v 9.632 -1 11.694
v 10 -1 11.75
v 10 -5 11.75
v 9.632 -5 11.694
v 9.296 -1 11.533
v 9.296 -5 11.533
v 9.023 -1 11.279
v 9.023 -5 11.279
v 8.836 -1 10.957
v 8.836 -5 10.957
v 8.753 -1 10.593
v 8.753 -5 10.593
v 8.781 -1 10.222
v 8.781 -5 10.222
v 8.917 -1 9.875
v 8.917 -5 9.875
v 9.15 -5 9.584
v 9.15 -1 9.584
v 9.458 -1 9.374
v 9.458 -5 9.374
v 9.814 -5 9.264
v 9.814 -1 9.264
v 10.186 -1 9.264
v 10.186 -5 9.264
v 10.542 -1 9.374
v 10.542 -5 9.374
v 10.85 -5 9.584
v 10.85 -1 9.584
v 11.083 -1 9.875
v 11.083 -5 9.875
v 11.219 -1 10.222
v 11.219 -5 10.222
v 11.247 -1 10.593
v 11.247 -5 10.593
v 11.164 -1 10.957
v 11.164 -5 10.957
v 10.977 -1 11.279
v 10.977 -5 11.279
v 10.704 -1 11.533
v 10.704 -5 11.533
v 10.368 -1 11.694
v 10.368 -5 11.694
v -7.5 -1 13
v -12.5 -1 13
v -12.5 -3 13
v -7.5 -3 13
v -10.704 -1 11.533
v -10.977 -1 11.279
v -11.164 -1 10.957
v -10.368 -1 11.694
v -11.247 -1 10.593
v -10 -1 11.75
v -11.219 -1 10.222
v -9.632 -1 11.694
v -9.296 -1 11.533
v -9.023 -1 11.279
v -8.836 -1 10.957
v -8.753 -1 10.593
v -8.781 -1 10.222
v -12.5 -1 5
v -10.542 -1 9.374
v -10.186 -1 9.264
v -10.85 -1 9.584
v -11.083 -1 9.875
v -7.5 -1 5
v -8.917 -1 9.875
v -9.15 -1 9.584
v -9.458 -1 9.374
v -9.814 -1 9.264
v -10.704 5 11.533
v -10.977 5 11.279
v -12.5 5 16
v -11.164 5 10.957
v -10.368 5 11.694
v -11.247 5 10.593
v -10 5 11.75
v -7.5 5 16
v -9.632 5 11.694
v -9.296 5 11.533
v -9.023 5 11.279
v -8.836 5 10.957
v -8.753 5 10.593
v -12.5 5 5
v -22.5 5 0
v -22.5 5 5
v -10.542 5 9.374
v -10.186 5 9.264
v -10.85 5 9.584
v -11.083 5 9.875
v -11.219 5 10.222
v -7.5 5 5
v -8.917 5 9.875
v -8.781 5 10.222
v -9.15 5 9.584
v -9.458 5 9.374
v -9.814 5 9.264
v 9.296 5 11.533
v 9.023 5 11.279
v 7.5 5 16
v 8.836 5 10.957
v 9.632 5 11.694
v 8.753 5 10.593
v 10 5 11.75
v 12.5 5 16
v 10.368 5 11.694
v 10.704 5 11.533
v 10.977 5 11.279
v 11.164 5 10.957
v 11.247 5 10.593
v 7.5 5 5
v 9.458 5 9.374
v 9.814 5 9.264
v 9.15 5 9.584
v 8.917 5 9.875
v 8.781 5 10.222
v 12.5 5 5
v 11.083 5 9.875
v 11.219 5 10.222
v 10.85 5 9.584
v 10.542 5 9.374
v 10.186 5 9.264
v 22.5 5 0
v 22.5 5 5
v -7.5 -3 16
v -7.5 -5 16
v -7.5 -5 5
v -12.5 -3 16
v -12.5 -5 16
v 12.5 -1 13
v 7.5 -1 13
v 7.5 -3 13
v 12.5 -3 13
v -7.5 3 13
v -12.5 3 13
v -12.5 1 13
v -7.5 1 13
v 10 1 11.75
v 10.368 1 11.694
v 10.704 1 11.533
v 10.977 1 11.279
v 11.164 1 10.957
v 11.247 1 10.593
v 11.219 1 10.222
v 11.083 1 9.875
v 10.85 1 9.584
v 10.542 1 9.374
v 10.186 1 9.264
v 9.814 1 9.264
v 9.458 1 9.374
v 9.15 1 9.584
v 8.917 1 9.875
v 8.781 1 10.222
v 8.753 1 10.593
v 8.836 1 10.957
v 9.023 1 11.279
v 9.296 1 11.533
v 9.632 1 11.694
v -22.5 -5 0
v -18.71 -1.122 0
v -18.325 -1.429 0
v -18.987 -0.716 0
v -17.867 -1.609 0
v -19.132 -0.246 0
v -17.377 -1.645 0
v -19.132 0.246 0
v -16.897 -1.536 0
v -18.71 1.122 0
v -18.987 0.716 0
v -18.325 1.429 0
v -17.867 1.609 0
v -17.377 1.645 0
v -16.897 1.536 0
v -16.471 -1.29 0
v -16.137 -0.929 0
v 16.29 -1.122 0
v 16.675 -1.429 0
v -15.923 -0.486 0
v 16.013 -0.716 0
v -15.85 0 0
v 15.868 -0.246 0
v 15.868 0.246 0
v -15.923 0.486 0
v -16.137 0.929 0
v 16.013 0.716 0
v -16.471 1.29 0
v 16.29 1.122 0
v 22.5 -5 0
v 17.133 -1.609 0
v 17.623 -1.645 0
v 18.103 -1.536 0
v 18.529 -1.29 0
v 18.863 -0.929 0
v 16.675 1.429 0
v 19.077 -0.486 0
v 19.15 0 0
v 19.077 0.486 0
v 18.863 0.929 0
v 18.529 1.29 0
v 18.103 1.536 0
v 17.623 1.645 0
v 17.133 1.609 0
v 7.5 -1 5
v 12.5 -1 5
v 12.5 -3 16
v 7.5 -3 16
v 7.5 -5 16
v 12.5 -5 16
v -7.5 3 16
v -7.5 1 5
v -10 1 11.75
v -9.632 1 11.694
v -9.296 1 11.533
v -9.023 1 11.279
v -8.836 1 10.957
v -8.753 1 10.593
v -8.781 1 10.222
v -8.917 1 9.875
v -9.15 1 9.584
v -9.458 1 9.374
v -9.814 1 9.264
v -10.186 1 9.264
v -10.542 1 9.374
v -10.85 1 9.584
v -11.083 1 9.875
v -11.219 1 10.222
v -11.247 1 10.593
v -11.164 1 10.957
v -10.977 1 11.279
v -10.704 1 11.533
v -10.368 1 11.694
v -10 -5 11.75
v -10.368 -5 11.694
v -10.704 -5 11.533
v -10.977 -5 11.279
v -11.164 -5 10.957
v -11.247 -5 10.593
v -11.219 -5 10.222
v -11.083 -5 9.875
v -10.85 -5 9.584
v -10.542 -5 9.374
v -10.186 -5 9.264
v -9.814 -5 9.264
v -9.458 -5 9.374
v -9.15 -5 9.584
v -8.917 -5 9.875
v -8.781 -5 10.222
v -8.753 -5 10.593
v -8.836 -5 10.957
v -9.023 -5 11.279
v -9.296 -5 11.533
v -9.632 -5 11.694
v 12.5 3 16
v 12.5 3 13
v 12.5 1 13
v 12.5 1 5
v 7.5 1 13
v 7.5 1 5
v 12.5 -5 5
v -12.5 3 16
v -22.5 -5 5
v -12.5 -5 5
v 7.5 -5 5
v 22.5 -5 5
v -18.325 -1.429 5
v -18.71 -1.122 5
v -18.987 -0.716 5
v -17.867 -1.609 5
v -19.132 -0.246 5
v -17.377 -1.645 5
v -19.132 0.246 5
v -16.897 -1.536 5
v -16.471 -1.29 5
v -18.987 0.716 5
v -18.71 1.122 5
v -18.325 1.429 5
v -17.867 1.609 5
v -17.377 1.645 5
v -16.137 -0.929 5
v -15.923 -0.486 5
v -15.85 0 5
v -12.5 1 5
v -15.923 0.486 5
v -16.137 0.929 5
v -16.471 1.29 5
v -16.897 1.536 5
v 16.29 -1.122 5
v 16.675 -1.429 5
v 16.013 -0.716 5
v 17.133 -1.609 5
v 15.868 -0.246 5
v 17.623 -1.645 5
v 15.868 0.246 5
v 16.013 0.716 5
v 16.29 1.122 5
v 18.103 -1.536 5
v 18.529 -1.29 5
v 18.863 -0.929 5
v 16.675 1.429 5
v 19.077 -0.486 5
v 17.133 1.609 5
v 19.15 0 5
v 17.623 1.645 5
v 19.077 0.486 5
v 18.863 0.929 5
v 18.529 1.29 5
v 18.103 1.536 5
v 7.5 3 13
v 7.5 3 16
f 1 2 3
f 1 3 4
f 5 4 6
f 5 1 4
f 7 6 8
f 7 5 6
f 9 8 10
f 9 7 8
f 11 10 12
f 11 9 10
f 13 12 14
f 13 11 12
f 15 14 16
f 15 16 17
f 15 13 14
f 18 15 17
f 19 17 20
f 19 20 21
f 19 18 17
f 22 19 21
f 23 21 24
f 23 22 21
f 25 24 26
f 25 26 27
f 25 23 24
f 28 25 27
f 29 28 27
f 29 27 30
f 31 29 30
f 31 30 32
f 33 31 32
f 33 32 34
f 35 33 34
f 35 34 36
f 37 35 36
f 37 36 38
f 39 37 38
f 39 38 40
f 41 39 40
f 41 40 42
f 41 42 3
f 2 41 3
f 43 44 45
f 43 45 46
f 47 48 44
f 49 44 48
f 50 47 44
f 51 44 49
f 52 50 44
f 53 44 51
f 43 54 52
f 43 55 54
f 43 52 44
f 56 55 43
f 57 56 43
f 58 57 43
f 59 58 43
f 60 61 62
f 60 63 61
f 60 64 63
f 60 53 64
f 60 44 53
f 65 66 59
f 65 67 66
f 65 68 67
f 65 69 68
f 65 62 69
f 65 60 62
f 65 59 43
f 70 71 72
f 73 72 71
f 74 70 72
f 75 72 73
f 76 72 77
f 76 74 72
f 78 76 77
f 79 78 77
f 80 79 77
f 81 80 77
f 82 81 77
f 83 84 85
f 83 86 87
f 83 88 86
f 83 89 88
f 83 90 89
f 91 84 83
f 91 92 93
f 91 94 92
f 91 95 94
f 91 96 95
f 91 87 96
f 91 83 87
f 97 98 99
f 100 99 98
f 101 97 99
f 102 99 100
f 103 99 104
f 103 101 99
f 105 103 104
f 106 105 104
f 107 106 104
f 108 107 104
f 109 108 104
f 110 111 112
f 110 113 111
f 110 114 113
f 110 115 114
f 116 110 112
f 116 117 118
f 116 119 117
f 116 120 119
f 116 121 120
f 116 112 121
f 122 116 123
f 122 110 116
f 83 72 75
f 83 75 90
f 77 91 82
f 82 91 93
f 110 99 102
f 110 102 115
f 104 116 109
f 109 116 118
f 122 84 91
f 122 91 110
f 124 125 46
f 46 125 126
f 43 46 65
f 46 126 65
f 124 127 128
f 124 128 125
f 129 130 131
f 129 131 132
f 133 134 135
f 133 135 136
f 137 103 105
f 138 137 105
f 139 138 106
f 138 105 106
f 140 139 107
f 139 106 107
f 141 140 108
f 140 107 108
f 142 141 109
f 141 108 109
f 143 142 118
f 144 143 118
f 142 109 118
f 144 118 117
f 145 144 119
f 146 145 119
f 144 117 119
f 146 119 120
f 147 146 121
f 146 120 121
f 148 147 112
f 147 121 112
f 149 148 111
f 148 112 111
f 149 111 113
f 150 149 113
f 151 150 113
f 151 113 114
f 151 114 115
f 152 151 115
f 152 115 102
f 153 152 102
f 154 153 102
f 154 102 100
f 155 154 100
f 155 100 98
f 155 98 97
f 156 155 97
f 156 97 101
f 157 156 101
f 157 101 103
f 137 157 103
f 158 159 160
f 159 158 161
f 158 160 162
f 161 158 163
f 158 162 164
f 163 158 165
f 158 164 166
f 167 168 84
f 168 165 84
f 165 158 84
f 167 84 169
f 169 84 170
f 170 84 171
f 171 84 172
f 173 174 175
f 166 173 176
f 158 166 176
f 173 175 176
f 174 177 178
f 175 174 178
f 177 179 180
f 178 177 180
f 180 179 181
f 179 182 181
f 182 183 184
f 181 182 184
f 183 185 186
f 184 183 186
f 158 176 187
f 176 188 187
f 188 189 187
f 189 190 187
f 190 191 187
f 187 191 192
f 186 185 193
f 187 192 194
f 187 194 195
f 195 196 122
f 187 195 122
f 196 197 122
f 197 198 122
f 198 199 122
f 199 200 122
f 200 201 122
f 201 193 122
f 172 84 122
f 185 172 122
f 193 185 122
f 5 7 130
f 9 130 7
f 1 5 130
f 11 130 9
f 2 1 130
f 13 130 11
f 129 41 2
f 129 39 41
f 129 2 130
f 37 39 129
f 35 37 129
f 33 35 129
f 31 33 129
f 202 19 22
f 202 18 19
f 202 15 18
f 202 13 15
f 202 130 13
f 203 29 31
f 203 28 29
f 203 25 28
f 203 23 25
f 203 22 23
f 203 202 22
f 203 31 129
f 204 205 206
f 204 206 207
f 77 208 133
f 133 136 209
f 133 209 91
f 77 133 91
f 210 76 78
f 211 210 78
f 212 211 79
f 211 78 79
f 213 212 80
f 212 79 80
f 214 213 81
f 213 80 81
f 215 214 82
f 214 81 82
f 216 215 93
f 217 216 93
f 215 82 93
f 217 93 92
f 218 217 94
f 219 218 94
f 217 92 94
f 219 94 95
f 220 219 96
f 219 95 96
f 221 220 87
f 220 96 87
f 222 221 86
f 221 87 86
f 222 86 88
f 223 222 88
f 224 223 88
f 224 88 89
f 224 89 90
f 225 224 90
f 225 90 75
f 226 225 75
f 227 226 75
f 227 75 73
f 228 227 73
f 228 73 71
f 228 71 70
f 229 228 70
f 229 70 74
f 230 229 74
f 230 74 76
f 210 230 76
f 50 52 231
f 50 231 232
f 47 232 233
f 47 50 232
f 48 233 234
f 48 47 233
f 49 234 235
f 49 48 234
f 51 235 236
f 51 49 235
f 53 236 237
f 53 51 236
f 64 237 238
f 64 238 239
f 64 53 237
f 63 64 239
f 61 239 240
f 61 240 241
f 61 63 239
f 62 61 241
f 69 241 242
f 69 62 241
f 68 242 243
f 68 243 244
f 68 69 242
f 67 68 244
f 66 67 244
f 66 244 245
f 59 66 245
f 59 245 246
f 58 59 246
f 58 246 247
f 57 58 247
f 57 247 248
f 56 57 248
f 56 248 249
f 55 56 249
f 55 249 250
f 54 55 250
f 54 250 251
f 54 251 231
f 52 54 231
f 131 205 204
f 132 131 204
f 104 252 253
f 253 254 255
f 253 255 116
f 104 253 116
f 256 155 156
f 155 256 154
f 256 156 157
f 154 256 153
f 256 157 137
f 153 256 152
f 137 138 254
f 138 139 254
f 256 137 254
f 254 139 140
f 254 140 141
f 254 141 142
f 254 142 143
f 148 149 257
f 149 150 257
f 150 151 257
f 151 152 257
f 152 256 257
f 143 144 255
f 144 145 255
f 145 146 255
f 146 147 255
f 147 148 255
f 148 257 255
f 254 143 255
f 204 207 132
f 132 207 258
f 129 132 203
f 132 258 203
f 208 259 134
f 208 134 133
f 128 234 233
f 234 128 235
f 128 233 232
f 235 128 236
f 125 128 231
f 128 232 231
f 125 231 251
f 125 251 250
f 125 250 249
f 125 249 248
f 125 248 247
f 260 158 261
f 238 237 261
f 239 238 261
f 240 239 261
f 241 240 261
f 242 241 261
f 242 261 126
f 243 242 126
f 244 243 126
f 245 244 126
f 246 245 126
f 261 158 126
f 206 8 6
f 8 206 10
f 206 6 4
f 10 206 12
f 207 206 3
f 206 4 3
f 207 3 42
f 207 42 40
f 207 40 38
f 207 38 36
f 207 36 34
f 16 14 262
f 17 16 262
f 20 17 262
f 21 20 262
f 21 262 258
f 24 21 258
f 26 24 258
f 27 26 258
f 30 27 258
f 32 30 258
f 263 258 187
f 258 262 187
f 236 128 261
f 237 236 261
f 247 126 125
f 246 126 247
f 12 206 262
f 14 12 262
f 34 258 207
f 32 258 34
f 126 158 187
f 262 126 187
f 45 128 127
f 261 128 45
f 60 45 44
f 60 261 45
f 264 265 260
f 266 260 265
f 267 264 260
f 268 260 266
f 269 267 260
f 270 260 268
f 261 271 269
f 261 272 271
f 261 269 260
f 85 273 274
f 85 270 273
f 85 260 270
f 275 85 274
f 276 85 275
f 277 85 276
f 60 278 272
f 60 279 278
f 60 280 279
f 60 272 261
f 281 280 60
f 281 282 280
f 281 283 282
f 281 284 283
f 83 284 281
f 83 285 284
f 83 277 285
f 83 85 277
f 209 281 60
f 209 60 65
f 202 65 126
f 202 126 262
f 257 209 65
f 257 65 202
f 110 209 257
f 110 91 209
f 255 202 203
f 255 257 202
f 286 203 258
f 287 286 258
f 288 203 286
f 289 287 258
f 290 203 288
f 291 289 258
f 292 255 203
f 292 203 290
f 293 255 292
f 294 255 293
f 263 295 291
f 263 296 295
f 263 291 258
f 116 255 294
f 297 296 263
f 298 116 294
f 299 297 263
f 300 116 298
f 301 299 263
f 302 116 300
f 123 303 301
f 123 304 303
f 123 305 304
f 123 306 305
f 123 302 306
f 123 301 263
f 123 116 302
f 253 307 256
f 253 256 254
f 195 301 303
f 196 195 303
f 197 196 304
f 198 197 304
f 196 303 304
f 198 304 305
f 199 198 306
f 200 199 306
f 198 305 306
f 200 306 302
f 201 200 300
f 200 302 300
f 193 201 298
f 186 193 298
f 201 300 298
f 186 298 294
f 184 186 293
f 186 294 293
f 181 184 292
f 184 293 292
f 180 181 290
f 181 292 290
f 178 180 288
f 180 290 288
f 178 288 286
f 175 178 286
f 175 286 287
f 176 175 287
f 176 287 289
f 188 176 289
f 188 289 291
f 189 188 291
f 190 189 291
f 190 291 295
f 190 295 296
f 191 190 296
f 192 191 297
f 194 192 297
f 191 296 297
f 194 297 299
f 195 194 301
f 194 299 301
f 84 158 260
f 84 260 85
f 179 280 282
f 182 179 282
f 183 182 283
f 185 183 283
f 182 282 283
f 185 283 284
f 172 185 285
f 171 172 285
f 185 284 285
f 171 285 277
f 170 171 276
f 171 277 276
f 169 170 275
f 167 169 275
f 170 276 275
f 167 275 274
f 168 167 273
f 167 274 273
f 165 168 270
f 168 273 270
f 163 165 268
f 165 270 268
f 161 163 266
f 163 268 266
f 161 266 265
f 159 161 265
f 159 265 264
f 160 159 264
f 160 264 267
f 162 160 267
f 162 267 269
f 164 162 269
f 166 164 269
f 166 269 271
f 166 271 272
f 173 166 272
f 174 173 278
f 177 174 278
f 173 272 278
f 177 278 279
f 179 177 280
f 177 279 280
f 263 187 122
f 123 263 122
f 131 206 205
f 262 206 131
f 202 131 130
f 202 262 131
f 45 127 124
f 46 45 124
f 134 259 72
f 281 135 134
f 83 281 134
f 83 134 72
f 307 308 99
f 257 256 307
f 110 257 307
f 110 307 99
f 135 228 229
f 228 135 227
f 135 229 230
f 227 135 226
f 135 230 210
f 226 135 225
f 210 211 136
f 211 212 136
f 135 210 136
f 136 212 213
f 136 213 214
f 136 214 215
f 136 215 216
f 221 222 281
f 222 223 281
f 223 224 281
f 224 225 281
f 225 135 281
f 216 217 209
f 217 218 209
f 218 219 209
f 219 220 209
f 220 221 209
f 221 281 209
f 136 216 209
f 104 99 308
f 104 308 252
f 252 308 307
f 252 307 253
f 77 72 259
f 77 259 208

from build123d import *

# Parameters (mm, degrees)
SKETCH_1_W          = 45
SKETCH_1_H          = 10
EXTRUDE_1_DEPTH     = 5
SKETCH_2_W          = 5
SKETCH_2_H          = 4
EXTRUDE_2_DEPTH     = 11
SKETCH_3_W          = 5
SKETCH_3_H          = 2
CUT_EXTRUDE_1_DEPTH = 3
SKETCH_4_W          = 5
SKETCH_4_H          = 2
CUT_EXTRUDE_2_DEPTH = 3
SKETCH_5_R          = 1.25
CUT_EXTRUDE_3_DEPTH = 10
SKETCH_6_R          = 1.65
CUT_EXTRUDE_4_DEPTH = 5
SKETCH_7_W          = 5
SKETCH_7_H          = 4
EXTRUDE_3_DEPTH     = 11
SKETCH_8_W          = 5
SKETCH_8_H          = 2
CUT_EXTRUDE_5_DEPTH = 3
SKETCH_9_W          = 5
SKETCH_9_H          = 2
CUT_EXTRUDE_6_DEPTH = 3
CUT_EXTRUDE_START   = -5
SKETCH_11_R         = 1.25
CUT_EXTRUDE_7_DEPTH = 5


with BuildPart() as part:
    # Эскиз1 → Бобышка-Вытянуть1 (new body)
    with BuildSketch(Plane.XY):
        Rectangle(SKETCH_1_W, SKETCH_1_H)
    extrude(amount=EXTRUDE_1_DEPTH)

    # Эскиз2 → Бобышка-Вытянуть2 (add)
    with BuildSketch(Plane.XY.offset(5)):
        with Locations((-10, 3)):
            Rectangle(SKETCH_2_W, SKETCH_2_H)
        with Locations((10, 3)):
            Rectangle(SKETCH_2_W, SKETCH_2_H)
    extrude(amount=EXTRUDE_2_DEPTH)

    # Эскиз3 → Вырез-Вытянуть1 (cut)
    with BuildSketch(Plane.XY.offset(16)):
        with Locations((-10, 2)):
            Rectangle(SKETCH_3_W, SKETCH_3_H)
    extrude(amount=-CUT_EXTRUDE_1_DEPTH, mode=Mode.SUBTRACT)

    # Эскиз4 → Вырез-Вытянуть2 (cut)
    with BuildSketch(Plane.XY.offset(16)):
        with Locations((10, 2)):
            Rectangle(SKETCH_4_W, SKETCH_4_H)
    extrude(amount=-CUT_EXTRUDE_2_DEPTH, mode=Mode.SUBTRACT)

    # Эскиз5 → Вырез-Вытянуть3 (cut)
    with BuildSketch(Plane(origin=(0, 5, 0), x_dir=(1, 0, 0), z_dir=(0, 1, 0))):
        with Locations(Location((-10, -10.5, 0), (0, 0, 270))):
            Circle(SKETCH_5_R)
        with Locations(Location((10, -10.5, 0), (0, 0, 270))):
            Circle(SKETCH_5_R)
    extrude(amount=-CUT_EXTRUDE_3_DEPTH, mode=Mode.SUBTRACT)

    # Эскиз6 → Вырез-Вытянуть4 (cut)
    with BuildSketch(Plane.XY.offset(5)):
        with Locations((-17.5, 0)):
            Circle(SKETCH_6_R)
        with Locations((17.5, 0)):
            Circle(SKETCH_6_R)
    extrude(amount=-CUT_EXTRUDE_4_DEPTH, mode=Mode.SUBTRACT)

    # Эскиз7 → Бобышка-Вытянуть3 (add)
    with BuildSketch(Plane.XY.offset(5)):
        with Locations((-10, -3)):
            Rectangle(SKETCH_7_W, SKETCH_7_H)
        with Locations((10, -3)):
            Rectangle(SKETCH_7_W, SKETCH_7_H)
    extrude(amount=EXTRUDE_3_DEPTH)

    # Эскиз8 → Вырез-Вытянуть5 (cut)
    with BuildSketch(Plane.XY.offset(16)):
        with Locations((-10, -2)):
            Rectangle(SKETCH_8_W, SKETCH_8_H)
    extrude(amount=-CUT_EXTRUDE_5_DEPTH, mode=Mode.SUBTRACT)

    # Эскиз9 → Вырез-Вытянуть6 (cut)
    with BuildSketch(Plane.XY.offset(16)):
        with Locations((10, -2)):
            Rectangle(SKETCH_9_W, SKETCH_9_H)
    extrude(amount=-CUT_EXTRUDE_6_DEPTH, mode=Mode.SUBTRACT)

    # Эскиз11 → Вырез-Вытянуть7 (cut)
    with BuildSketch(Plane.XZ.offset(5).offset(CUT_EXTRUDE_START)):
        with Locations(Location((-10, 10.5, 0), (0, 0, 90))):
            Circle(SKETCH_11_R)
        with Locations(Location((10, 10.5, 0), (0, 0, 90))):
            Circle(SKETCH_11_R)
    extrude(amount=CUT_EXTRUDE_7_DEPTH, mode=Mode.SUBTRACT)


solid = part.part
